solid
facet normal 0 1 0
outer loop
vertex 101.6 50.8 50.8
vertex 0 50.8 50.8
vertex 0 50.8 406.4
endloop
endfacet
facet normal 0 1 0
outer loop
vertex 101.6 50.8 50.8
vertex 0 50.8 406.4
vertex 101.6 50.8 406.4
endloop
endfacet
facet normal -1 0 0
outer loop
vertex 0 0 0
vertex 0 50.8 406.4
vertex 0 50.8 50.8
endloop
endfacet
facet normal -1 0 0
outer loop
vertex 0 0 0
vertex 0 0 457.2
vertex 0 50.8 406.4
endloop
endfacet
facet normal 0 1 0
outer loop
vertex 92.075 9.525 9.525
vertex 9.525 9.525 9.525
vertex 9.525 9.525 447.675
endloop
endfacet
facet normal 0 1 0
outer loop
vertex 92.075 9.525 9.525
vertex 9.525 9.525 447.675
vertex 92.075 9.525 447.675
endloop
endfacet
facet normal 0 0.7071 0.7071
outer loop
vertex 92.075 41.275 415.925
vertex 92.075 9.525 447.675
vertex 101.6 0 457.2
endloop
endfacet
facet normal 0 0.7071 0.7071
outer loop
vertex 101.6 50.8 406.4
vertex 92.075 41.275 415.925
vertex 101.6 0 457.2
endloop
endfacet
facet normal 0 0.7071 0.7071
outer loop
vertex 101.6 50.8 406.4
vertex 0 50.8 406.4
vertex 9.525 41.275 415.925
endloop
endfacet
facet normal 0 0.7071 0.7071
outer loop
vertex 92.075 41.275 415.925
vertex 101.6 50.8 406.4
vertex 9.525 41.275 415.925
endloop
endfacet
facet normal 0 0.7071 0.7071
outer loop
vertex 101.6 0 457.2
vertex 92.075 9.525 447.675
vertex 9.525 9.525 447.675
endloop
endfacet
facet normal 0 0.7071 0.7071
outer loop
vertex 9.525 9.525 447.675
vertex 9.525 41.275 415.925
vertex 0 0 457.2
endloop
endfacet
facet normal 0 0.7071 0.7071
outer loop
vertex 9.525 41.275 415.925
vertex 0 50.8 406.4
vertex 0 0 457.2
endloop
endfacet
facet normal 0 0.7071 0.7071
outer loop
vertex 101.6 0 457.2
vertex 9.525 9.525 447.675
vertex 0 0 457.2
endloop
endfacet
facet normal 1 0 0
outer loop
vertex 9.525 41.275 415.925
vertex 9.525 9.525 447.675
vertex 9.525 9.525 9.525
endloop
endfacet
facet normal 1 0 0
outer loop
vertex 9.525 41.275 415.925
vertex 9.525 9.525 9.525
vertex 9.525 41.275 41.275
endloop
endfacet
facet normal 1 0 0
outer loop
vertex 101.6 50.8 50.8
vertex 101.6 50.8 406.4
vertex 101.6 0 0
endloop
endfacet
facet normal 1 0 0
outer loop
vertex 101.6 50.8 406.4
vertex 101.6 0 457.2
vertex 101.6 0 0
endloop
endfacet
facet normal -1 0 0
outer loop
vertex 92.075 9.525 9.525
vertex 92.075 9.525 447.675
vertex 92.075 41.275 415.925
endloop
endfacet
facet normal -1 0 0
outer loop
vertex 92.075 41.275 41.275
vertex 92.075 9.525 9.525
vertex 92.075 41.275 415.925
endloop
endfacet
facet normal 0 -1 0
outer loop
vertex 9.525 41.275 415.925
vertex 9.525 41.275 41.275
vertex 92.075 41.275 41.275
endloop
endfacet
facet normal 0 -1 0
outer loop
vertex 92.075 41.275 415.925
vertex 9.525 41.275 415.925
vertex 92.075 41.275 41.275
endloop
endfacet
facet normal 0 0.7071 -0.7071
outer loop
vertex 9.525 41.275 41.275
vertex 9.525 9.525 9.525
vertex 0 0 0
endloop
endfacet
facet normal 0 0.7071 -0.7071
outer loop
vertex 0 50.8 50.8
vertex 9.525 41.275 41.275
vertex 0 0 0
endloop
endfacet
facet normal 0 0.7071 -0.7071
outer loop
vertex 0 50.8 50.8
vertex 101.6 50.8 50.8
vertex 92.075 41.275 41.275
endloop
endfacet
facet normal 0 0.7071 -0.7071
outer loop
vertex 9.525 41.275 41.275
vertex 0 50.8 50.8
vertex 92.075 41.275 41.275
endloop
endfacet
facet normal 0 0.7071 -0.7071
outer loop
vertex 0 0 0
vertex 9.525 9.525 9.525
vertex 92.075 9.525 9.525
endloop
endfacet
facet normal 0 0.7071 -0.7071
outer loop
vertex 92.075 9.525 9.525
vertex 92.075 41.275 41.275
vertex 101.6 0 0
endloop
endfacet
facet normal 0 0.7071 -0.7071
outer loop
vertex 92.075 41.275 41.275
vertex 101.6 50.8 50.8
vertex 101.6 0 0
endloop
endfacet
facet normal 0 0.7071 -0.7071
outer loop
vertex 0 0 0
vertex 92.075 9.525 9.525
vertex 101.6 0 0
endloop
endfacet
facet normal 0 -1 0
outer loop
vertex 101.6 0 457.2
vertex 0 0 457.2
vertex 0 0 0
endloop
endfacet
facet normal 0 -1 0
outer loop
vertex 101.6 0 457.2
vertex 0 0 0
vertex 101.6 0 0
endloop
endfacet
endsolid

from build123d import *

# Parameters (mm, degrees)
F0_W     = 101.6
F0_H     = 50.8
F1_DEPTH = 457.2
F2_W     = 82.55
F2_H     = 31.75
F3_DEPTH = 457.2
F5_DEPTH = 101.6
F7_DEPTH = 101.6


with BuildPart() as f1:
    # F0 (on Top) → F1 (new body)
    with BuildSketch(Plane.XY):
        with Locations((50.8, 25.4)):
            Rectangle(F0_W, F0_H)
    extrude(amount=F1_DEPTH)

    # F2 (on face) → F3 (cut)
    with BuildSketch(Plane.XY.offset(457.2)):
        with Locations((50.8, 25.4)):
            Rectangle(F2_W, F2_H)
    extrude(amount=-F3_DEPTH, mode=Mode.SUBTRACT)

    # F4 (on face) → F5 (cut)
    with BuildSketch(Plane.YZ.offset(101.6)):
        Polygon((50.8, 50.8), (0, 0), (50.8, 0), align=None)
    extrude(amount=-F5_DEPTH, mode=Mode.SUBTRACT)

    # F6 (on face) → F7 (cut)
    with BuildSketch(Plane(origin=(0, 0, 0), x_dir=(0, -1, 0), z_dir=(-1, 0, 0))):
        Polygon((0, 457.2), (-50.8, 457.2), (-50.8, 406.4), align=None)
    extrude(amount=-F7_DEPTH, mode=Mode.SUBTRACT)


solid = f1.part
